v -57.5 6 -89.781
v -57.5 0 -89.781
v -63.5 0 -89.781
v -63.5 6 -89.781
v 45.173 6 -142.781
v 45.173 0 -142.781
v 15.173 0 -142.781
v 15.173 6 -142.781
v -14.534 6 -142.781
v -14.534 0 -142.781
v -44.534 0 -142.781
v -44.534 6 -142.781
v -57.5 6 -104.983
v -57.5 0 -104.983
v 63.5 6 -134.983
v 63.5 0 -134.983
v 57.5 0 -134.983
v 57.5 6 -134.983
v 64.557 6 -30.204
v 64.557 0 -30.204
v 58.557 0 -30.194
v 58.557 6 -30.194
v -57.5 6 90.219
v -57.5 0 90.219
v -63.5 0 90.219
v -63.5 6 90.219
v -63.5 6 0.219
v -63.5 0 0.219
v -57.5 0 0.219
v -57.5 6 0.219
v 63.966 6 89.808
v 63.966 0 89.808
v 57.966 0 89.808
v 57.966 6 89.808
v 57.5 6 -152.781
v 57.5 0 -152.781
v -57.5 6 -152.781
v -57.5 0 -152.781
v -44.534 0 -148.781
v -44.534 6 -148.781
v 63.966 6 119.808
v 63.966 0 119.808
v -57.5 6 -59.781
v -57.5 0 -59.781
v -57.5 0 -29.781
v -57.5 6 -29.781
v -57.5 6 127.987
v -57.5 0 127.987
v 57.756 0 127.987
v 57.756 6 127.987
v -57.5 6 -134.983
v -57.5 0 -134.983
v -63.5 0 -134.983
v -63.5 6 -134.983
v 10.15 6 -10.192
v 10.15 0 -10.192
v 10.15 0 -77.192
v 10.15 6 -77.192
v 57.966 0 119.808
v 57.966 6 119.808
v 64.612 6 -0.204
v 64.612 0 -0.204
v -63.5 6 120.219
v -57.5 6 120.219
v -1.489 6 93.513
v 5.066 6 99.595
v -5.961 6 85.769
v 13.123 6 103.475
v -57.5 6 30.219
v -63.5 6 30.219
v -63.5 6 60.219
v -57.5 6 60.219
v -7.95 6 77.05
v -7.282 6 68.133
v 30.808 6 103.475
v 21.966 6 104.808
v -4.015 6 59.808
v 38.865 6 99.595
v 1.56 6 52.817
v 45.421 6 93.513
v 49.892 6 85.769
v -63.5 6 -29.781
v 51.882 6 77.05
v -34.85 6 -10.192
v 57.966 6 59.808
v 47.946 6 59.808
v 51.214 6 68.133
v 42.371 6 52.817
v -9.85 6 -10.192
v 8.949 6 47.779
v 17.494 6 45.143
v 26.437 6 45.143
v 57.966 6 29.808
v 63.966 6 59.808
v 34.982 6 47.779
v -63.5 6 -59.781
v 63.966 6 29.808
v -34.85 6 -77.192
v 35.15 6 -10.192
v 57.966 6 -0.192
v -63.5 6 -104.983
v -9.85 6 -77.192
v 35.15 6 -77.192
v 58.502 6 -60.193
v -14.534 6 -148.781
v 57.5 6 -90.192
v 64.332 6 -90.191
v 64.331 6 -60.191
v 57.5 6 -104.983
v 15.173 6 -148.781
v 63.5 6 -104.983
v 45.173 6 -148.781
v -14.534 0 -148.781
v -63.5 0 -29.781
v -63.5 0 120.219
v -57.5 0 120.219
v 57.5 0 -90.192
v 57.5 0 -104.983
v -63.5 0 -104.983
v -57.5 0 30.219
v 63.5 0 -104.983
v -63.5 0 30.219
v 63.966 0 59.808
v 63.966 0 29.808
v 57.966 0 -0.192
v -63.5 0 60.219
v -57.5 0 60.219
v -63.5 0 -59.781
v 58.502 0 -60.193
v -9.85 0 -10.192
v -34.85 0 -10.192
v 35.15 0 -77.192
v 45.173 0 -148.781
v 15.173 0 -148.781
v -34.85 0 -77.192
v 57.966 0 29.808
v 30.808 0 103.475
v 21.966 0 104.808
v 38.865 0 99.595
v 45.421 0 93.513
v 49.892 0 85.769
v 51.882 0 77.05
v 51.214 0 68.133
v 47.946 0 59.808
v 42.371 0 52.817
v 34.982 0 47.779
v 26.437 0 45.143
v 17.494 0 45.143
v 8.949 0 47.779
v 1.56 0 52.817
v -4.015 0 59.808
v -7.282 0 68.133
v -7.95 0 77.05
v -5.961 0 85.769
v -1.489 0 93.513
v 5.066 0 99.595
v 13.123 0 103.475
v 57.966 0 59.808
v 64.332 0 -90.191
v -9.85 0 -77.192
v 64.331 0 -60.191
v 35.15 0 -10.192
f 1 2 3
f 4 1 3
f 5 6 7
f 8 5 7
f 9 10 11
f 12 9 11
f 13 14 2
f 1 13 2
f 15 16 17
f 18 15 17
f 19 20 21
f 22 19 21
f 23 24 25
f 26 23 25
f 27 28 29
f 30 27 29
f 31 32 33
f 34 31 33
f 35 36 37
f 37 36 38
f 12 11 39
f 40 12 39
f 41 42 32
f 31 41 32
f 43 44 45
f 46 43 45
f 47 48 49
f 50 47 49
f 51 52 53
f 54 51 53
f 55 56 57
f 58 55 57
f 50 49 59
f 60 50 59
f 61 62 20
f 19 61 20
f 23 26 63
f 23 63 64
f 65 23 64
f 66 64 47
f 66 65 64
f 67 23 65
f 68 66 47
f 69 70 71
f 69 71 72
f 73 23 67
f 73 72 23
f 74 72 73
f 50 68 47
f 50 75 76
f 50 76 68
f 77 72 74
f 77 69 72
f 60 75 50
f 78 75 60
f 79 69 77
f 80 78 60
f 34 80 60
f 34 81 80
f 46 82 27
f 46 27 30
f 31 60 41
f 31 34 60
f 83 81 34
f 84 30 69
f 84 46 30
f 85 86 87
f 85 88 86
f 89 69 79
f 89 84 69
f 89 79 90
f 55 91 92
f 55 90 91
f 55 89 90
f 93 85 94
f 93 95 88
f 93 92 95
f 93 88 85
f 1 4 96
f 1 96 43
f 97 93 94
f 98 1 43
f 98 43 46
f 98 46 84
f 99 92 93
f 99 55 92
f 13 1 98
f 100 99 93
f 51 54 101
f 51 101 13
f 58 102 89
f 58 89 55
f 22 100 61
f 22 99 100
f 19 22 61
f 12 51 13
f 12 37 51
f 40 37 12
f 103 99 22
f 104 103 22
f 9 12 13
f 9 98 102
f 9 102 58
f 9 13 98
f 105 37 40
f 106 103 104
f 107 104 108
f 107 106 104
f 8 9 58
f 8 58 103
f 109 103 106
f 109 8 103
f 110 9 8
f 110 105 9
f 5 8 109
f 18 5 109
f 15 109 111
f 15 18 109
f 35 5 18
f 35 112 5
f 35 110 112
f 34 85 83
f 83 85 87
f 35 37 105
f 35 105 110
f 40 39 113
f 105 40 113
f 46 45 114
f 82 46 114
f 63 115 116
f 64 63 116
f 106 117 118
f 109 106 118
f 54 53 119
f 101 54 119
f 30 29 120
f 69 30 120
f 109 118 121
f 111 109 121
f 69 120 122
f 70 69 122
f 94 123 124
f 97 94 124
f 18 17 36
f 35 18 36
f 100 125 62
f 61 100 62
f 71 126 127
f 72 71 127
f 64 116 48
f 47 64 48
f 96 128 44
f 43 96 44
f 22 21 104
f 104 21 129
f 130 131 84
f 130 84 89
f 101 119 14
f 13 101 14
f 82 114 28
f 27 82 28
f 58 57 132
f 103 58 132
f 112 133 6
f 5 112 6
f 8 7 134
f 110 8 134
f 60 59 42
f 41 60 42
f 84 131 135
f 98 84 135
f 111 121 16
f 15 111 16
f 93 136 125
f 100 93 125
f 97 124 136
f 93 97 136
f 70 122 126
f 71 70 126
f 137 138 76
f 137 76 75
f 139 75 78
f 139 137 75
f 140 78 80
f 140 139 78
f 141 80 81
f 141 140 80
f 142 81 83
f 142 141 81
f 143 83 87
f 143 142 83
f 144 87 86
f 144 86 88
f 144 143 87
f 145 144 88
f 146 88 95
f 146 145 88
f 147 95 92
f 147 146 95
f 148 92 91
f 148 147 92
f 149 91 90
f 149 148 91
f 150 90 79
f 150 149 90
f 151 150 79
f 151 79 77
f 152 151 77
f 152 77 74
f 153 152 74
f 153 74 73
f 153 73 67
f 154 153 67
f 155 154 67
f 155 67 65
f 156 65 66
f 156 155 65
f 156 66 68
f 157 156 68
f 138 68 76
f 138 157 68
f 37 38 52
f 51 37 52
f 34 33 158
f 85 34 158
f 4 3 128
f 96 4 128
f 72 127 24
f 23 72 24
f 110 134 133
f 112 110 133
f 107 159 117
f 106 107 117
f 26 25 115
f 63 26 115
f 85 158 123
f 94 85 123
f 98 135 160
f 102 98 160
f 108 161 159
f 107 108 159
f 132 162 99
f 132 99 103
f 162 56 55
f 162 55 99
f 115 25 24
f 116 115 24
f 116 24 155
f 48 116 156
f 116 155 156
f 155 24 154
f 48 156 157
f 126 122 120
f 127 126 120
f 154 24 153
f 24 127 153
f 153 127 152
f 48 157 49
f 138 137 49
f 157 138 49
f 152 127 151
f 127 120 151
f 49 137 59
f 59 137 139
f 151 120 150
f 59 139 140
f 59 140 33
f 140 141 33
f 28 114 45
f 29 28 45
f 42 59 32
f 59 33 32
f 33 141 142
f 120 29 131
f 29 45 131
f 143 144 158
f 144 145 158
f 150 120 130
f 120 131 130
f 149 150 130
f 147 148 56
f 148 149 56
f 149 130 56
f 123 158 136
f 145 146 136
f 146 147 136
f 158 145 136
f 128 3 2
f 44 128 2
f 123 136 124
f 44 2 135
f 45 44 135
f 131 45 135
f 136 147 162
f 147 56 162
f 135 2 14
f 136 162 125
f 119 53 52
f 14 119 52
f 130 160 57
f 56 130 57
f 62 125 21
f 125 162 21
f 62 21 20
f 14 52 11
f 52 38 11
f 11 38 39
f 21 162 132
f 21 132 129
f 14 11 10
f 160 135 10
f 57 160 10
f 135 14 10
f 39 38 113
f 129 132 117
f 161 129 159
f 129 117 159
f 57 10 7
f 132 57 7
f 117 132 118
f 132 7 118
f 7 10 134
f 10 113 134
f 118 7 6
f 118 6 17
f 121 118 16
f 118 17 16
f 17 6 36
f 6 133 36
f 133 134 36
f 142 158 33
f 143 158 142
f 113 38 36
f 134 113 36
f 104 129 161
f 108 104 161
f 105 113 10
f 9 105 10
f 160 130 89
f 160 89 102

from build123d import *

# Parameters (mm, degrees)
SKETCH_1_R      = 30
SKETCH_1_W      = 25
SKETCH_1_H      = 67
EXTRUDE_1_DEPTH = 6


with BuildPart() as part:
    # Эскиз1 → Бобышка-Вытянуть1 (new body)
    with BuildSketch(Plane(origin=(0, 0, 0), x_dir=(1, 0, 0), z_dir=(0, 1, 0))):
        Polygon((-63.5, -90.219106224), (-63.5, -120.219106224), (-57.5, -120.219106224), (-57.5, -127.987103964), (-44.534331601, -127.987103964), (-14.534331601, -127.987103964), (15.172762814, -127.987103964), (45.172762814, -127.987103964), (57.756160079, -127.987103964), (57.965668399, -119.808299483), (63.965668399, -119.808299483), (63.965668399, -89.808299483), (57.965668399, -89.808299483), (57.965668399, -59.808299483), (63.965668399, -59.808299483), (63.965668399, -29.808299483), (57.965668399, -29.808299483), (57.965668399, 0.191700517), (64.611703668, 0.204499173), (64.557084704, 30.204449452), (58.557094649, 30.193525659), (58.502475685, 60.193475939), (64.331284091, 60.191395834), (64.331888746, 90.191395828), (57.5, 90.191533526), (57.5, 104.982806986), (63.5, 104.982806986), (63.5, 134.982806986), (57.5, 134.982806986), (57.5, 152.780893776), (-14.534331601, 152.780893776), (-57.5, 152.780893776), (-57.5, 134.982806986), (-63.5, 134.982806986), (-63.5, 104.982806986), (-57.5, 104.982806986), (-57.5, 89.780893776), (-63.5, 89.780893776), (-63.5, 59.780893776), (-63.034331601, 59.780893776), (-57.5, 59.780893776), (-57.5, 42.012896036), (-57.5, 29.780893776), (-63.5, 29.780893776), (-63.5, -0.219106224), (-63.034331601, -0.219106224), (-57.5, -0.219106224), (-57.5, -17.987103964), (-57.5, -30.219106224), (-63.5, -30.219106224), (-63.5, -60.219106224), (-63.034331601, -60.219106224), (-57.5, -60.219106224), (-57.5, -77.987103964), (-57.5, -90.219106224), align=None)
        with Locations(Location((21.965668399, -74.808299483, 0), (0, 0, 270))):
            Circle(SKETCH_1_R, mode=Mode.SUBTRACT)
        with Locations((-22.350212696, 43.691700517)):
            Rectangle(SKETCH_1_W, SKETCH_1_H, mode=Mode.SUBTRACT)
        Polygon((-14.534331601, 142.780893776), (-44.534331601, 142.780893776), (-44.534331601, 146.780893776), (-44.534331601, 148.780893776), (-14.534331601, 148.780893776), (-14.534331601, 146.780893776), align=None, mode=Mode.SUBTRACT)
        with Locations((22.649787304, 43.691700517)):
            Rectangle(SKETCH_1_W, SKETCH_1_H, mode=Mode.SUBTRACT)
        Polygon((45.172762814, 142.780893776), (15.172762814, 142.780893776), (15.172762814, 146.780893776), (15.172762814, 148.780893776), (45.172762814, 148.780893776), (45.172762814, 146.780893776), align=None, mode=Mode.SUBTRACT)
    extrude(amount=EXTRUDE_1_DEPTH)


solid = part.part
